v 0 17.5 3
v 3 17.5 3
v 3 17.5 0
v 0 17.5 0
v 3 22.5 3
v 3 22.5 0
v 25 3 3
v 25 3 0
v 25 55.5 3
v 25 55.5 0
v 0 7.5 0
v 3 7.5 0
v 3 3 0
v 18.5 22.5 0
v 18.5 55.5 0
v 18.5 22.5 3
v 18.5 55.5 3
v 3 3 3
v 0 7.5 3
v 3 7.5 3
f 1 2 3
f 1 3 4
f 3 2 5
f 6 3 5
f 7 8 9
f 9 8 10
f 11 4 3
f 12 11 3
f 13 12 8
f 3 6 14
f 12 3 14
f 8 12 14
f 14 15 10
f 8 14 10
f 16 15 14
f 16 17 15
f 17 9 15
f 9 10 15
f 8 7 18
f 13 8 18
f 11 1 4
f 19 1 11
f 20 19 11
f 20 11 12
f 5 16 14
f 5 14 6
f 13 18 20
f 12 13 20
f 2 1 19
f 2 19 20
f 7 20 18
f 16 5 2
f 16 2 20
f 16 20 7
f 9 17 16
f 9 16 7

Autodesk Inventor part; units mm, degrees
ref_plane "YZ Plane" through (0, 0, 0) normal (1, 0, 0) x (0, 1, 0)
ref_plane "XZ Plane" through (0, 0, 0) normal (0, 1, 0) x (-1, 0, 0)
ref_plane "XY Plane" through (0, 0, 0) normal (0, 0, 1) x (1, 0, 0)
sketch "Sketch1" plane through (0, 0, 0) normal (0, 0, 1) x (1, 0, 0)
  line L0 (0, 0) -> (25, 0)
  line L1 (25, 0) -> (25, 55.5)
  line L2 (25, 55.5) -> (0, 55.5)
  line L3 (0, 55.5) -> (0, 0)
  dimension "d0" = 25
  dimension "d1" = 55.5
extrude "Extrusion1" add sketch "Sketch1" along normal blind 3
sketch "Sketch2" plane through (0, 0, 3) normal (0, 0, 1) x (1, 0, 0)
  line L0 (0, 55.5) -> (0, 0) projected
  line L1 (25, 55.5) -> (0, 55.5) projected
  line L2 (0, 0) -> (3, 0)
  line L3 (3, 0) -> (3, 55.5)
  line L4 (3, 55.5) -> (0, 55.5)
  line L5 (0, 55.5) -> (0, 0)
  dimension "d4" = 3
extrude "Extrusion2" cut sketch "Sketch2" against normal through all
sketch "Sketch3" plane through (0, 0, 3) normal (0, 0, 1) x (1, 0, 0)
  point P0 (0, 0)
sketch "Sketch4" plane through (0, 0, 3) normal (0, 0, 1) x (1, 0, 0)
  line L0 (25, 55.5) -> (3, 55.5) projected
  line L1 (3, 55.5) -> (18.5, 55.5)
  line L2 (18.5, 55.5) -> (18.5, 22.5)
  line L3 (18.5, 22.5) -> (3, 22.5)
  line L4 (3, 22.5) -> (3, 55.5)
  point P0 (0, 0)
  dimension "d7" = 15.5
  dimension "d8" = 33
extrude "Extrusion3" cut sketch "Sketch4" against normal through all
sketch "Sketch5" plane through (0, 0, 3) normal (0, 0, 1) x (1, 0, 0)
  line L0 (3, 0) -> (25, 0) projected
  line L1 (8, 0) -> (18, 0)
  line L2 (18, 0) -> (18, 3)
  line L3 (18, 3) -> (8, 3)
  line L4 (8, 3) -> (8, 0)
  line L5 (3, 22.5) -> (3, 0) projected
  line L6 (3, 0) -> (8, 0)
  line L7 (8, 0) -> (8, 3)
  line L8 (8, 3) -> (3, 3)
  line L9 (3, 3) -> (3, 0)
  line L10 (18, 0) -> (25, 0)
  line L11 (25, 0) -> (25, 3)
  line L12 (25, 3) -> (18, 3)
  line L13 (18, 3) -> (18, 0)
  point P0 (0, 0)
  dimension "d11" = 10
  dimension "d12" = 3
  dimension "d13" = 5
extrude "Extrusion4" cut sketch "Sketch5" against normal through all contours L5 L8 L4 L0 | L2 L12 L11 L0
sketch "Sketch6" plane through (0, 0, 3) normal (0, 0, 1) x (1, 0, 0)
  line L0 (8, 0) -> (18, 0) projected
  line L1 (18, 3) -> (25, 3) projected
  line L2 (8, 0) -> (18, 0)
  line L3 (18, 0) -> (18, 3)
  line L4 (18, 3) -> (8, 3)
  line L5 (8, 3) -> (8, 0)
  point P0 (0, 0)
extrude "Extrusion5" cut sketch "Sketch6" against normal through all
sketch "Sketch7" plane through (0, 0, 3) normal (0, 0, 1) x (1, 0, 0)
  line L0 (3, 22.5) -> (3, 3) projected
  line L1 (3, 17.5) -> (0, 17.5)
  line L2 (0, 17.5) -> (0, 7.5)
  line L3 (0, 7.5) -> (3, 7.5)
  line L4 (3, 7.5) -> (3, 17.5)
  line L5 (3, 3) -> (25, 3) projected
  point P0 (0, 0)
  dimension "d18" = 3
  dimension "d19" = 10
  dimension "d20" = 4.5
extrude "Extrusion6" add sketch "Sketch7" against normal blind 3
properties part number "hollow_mount"
